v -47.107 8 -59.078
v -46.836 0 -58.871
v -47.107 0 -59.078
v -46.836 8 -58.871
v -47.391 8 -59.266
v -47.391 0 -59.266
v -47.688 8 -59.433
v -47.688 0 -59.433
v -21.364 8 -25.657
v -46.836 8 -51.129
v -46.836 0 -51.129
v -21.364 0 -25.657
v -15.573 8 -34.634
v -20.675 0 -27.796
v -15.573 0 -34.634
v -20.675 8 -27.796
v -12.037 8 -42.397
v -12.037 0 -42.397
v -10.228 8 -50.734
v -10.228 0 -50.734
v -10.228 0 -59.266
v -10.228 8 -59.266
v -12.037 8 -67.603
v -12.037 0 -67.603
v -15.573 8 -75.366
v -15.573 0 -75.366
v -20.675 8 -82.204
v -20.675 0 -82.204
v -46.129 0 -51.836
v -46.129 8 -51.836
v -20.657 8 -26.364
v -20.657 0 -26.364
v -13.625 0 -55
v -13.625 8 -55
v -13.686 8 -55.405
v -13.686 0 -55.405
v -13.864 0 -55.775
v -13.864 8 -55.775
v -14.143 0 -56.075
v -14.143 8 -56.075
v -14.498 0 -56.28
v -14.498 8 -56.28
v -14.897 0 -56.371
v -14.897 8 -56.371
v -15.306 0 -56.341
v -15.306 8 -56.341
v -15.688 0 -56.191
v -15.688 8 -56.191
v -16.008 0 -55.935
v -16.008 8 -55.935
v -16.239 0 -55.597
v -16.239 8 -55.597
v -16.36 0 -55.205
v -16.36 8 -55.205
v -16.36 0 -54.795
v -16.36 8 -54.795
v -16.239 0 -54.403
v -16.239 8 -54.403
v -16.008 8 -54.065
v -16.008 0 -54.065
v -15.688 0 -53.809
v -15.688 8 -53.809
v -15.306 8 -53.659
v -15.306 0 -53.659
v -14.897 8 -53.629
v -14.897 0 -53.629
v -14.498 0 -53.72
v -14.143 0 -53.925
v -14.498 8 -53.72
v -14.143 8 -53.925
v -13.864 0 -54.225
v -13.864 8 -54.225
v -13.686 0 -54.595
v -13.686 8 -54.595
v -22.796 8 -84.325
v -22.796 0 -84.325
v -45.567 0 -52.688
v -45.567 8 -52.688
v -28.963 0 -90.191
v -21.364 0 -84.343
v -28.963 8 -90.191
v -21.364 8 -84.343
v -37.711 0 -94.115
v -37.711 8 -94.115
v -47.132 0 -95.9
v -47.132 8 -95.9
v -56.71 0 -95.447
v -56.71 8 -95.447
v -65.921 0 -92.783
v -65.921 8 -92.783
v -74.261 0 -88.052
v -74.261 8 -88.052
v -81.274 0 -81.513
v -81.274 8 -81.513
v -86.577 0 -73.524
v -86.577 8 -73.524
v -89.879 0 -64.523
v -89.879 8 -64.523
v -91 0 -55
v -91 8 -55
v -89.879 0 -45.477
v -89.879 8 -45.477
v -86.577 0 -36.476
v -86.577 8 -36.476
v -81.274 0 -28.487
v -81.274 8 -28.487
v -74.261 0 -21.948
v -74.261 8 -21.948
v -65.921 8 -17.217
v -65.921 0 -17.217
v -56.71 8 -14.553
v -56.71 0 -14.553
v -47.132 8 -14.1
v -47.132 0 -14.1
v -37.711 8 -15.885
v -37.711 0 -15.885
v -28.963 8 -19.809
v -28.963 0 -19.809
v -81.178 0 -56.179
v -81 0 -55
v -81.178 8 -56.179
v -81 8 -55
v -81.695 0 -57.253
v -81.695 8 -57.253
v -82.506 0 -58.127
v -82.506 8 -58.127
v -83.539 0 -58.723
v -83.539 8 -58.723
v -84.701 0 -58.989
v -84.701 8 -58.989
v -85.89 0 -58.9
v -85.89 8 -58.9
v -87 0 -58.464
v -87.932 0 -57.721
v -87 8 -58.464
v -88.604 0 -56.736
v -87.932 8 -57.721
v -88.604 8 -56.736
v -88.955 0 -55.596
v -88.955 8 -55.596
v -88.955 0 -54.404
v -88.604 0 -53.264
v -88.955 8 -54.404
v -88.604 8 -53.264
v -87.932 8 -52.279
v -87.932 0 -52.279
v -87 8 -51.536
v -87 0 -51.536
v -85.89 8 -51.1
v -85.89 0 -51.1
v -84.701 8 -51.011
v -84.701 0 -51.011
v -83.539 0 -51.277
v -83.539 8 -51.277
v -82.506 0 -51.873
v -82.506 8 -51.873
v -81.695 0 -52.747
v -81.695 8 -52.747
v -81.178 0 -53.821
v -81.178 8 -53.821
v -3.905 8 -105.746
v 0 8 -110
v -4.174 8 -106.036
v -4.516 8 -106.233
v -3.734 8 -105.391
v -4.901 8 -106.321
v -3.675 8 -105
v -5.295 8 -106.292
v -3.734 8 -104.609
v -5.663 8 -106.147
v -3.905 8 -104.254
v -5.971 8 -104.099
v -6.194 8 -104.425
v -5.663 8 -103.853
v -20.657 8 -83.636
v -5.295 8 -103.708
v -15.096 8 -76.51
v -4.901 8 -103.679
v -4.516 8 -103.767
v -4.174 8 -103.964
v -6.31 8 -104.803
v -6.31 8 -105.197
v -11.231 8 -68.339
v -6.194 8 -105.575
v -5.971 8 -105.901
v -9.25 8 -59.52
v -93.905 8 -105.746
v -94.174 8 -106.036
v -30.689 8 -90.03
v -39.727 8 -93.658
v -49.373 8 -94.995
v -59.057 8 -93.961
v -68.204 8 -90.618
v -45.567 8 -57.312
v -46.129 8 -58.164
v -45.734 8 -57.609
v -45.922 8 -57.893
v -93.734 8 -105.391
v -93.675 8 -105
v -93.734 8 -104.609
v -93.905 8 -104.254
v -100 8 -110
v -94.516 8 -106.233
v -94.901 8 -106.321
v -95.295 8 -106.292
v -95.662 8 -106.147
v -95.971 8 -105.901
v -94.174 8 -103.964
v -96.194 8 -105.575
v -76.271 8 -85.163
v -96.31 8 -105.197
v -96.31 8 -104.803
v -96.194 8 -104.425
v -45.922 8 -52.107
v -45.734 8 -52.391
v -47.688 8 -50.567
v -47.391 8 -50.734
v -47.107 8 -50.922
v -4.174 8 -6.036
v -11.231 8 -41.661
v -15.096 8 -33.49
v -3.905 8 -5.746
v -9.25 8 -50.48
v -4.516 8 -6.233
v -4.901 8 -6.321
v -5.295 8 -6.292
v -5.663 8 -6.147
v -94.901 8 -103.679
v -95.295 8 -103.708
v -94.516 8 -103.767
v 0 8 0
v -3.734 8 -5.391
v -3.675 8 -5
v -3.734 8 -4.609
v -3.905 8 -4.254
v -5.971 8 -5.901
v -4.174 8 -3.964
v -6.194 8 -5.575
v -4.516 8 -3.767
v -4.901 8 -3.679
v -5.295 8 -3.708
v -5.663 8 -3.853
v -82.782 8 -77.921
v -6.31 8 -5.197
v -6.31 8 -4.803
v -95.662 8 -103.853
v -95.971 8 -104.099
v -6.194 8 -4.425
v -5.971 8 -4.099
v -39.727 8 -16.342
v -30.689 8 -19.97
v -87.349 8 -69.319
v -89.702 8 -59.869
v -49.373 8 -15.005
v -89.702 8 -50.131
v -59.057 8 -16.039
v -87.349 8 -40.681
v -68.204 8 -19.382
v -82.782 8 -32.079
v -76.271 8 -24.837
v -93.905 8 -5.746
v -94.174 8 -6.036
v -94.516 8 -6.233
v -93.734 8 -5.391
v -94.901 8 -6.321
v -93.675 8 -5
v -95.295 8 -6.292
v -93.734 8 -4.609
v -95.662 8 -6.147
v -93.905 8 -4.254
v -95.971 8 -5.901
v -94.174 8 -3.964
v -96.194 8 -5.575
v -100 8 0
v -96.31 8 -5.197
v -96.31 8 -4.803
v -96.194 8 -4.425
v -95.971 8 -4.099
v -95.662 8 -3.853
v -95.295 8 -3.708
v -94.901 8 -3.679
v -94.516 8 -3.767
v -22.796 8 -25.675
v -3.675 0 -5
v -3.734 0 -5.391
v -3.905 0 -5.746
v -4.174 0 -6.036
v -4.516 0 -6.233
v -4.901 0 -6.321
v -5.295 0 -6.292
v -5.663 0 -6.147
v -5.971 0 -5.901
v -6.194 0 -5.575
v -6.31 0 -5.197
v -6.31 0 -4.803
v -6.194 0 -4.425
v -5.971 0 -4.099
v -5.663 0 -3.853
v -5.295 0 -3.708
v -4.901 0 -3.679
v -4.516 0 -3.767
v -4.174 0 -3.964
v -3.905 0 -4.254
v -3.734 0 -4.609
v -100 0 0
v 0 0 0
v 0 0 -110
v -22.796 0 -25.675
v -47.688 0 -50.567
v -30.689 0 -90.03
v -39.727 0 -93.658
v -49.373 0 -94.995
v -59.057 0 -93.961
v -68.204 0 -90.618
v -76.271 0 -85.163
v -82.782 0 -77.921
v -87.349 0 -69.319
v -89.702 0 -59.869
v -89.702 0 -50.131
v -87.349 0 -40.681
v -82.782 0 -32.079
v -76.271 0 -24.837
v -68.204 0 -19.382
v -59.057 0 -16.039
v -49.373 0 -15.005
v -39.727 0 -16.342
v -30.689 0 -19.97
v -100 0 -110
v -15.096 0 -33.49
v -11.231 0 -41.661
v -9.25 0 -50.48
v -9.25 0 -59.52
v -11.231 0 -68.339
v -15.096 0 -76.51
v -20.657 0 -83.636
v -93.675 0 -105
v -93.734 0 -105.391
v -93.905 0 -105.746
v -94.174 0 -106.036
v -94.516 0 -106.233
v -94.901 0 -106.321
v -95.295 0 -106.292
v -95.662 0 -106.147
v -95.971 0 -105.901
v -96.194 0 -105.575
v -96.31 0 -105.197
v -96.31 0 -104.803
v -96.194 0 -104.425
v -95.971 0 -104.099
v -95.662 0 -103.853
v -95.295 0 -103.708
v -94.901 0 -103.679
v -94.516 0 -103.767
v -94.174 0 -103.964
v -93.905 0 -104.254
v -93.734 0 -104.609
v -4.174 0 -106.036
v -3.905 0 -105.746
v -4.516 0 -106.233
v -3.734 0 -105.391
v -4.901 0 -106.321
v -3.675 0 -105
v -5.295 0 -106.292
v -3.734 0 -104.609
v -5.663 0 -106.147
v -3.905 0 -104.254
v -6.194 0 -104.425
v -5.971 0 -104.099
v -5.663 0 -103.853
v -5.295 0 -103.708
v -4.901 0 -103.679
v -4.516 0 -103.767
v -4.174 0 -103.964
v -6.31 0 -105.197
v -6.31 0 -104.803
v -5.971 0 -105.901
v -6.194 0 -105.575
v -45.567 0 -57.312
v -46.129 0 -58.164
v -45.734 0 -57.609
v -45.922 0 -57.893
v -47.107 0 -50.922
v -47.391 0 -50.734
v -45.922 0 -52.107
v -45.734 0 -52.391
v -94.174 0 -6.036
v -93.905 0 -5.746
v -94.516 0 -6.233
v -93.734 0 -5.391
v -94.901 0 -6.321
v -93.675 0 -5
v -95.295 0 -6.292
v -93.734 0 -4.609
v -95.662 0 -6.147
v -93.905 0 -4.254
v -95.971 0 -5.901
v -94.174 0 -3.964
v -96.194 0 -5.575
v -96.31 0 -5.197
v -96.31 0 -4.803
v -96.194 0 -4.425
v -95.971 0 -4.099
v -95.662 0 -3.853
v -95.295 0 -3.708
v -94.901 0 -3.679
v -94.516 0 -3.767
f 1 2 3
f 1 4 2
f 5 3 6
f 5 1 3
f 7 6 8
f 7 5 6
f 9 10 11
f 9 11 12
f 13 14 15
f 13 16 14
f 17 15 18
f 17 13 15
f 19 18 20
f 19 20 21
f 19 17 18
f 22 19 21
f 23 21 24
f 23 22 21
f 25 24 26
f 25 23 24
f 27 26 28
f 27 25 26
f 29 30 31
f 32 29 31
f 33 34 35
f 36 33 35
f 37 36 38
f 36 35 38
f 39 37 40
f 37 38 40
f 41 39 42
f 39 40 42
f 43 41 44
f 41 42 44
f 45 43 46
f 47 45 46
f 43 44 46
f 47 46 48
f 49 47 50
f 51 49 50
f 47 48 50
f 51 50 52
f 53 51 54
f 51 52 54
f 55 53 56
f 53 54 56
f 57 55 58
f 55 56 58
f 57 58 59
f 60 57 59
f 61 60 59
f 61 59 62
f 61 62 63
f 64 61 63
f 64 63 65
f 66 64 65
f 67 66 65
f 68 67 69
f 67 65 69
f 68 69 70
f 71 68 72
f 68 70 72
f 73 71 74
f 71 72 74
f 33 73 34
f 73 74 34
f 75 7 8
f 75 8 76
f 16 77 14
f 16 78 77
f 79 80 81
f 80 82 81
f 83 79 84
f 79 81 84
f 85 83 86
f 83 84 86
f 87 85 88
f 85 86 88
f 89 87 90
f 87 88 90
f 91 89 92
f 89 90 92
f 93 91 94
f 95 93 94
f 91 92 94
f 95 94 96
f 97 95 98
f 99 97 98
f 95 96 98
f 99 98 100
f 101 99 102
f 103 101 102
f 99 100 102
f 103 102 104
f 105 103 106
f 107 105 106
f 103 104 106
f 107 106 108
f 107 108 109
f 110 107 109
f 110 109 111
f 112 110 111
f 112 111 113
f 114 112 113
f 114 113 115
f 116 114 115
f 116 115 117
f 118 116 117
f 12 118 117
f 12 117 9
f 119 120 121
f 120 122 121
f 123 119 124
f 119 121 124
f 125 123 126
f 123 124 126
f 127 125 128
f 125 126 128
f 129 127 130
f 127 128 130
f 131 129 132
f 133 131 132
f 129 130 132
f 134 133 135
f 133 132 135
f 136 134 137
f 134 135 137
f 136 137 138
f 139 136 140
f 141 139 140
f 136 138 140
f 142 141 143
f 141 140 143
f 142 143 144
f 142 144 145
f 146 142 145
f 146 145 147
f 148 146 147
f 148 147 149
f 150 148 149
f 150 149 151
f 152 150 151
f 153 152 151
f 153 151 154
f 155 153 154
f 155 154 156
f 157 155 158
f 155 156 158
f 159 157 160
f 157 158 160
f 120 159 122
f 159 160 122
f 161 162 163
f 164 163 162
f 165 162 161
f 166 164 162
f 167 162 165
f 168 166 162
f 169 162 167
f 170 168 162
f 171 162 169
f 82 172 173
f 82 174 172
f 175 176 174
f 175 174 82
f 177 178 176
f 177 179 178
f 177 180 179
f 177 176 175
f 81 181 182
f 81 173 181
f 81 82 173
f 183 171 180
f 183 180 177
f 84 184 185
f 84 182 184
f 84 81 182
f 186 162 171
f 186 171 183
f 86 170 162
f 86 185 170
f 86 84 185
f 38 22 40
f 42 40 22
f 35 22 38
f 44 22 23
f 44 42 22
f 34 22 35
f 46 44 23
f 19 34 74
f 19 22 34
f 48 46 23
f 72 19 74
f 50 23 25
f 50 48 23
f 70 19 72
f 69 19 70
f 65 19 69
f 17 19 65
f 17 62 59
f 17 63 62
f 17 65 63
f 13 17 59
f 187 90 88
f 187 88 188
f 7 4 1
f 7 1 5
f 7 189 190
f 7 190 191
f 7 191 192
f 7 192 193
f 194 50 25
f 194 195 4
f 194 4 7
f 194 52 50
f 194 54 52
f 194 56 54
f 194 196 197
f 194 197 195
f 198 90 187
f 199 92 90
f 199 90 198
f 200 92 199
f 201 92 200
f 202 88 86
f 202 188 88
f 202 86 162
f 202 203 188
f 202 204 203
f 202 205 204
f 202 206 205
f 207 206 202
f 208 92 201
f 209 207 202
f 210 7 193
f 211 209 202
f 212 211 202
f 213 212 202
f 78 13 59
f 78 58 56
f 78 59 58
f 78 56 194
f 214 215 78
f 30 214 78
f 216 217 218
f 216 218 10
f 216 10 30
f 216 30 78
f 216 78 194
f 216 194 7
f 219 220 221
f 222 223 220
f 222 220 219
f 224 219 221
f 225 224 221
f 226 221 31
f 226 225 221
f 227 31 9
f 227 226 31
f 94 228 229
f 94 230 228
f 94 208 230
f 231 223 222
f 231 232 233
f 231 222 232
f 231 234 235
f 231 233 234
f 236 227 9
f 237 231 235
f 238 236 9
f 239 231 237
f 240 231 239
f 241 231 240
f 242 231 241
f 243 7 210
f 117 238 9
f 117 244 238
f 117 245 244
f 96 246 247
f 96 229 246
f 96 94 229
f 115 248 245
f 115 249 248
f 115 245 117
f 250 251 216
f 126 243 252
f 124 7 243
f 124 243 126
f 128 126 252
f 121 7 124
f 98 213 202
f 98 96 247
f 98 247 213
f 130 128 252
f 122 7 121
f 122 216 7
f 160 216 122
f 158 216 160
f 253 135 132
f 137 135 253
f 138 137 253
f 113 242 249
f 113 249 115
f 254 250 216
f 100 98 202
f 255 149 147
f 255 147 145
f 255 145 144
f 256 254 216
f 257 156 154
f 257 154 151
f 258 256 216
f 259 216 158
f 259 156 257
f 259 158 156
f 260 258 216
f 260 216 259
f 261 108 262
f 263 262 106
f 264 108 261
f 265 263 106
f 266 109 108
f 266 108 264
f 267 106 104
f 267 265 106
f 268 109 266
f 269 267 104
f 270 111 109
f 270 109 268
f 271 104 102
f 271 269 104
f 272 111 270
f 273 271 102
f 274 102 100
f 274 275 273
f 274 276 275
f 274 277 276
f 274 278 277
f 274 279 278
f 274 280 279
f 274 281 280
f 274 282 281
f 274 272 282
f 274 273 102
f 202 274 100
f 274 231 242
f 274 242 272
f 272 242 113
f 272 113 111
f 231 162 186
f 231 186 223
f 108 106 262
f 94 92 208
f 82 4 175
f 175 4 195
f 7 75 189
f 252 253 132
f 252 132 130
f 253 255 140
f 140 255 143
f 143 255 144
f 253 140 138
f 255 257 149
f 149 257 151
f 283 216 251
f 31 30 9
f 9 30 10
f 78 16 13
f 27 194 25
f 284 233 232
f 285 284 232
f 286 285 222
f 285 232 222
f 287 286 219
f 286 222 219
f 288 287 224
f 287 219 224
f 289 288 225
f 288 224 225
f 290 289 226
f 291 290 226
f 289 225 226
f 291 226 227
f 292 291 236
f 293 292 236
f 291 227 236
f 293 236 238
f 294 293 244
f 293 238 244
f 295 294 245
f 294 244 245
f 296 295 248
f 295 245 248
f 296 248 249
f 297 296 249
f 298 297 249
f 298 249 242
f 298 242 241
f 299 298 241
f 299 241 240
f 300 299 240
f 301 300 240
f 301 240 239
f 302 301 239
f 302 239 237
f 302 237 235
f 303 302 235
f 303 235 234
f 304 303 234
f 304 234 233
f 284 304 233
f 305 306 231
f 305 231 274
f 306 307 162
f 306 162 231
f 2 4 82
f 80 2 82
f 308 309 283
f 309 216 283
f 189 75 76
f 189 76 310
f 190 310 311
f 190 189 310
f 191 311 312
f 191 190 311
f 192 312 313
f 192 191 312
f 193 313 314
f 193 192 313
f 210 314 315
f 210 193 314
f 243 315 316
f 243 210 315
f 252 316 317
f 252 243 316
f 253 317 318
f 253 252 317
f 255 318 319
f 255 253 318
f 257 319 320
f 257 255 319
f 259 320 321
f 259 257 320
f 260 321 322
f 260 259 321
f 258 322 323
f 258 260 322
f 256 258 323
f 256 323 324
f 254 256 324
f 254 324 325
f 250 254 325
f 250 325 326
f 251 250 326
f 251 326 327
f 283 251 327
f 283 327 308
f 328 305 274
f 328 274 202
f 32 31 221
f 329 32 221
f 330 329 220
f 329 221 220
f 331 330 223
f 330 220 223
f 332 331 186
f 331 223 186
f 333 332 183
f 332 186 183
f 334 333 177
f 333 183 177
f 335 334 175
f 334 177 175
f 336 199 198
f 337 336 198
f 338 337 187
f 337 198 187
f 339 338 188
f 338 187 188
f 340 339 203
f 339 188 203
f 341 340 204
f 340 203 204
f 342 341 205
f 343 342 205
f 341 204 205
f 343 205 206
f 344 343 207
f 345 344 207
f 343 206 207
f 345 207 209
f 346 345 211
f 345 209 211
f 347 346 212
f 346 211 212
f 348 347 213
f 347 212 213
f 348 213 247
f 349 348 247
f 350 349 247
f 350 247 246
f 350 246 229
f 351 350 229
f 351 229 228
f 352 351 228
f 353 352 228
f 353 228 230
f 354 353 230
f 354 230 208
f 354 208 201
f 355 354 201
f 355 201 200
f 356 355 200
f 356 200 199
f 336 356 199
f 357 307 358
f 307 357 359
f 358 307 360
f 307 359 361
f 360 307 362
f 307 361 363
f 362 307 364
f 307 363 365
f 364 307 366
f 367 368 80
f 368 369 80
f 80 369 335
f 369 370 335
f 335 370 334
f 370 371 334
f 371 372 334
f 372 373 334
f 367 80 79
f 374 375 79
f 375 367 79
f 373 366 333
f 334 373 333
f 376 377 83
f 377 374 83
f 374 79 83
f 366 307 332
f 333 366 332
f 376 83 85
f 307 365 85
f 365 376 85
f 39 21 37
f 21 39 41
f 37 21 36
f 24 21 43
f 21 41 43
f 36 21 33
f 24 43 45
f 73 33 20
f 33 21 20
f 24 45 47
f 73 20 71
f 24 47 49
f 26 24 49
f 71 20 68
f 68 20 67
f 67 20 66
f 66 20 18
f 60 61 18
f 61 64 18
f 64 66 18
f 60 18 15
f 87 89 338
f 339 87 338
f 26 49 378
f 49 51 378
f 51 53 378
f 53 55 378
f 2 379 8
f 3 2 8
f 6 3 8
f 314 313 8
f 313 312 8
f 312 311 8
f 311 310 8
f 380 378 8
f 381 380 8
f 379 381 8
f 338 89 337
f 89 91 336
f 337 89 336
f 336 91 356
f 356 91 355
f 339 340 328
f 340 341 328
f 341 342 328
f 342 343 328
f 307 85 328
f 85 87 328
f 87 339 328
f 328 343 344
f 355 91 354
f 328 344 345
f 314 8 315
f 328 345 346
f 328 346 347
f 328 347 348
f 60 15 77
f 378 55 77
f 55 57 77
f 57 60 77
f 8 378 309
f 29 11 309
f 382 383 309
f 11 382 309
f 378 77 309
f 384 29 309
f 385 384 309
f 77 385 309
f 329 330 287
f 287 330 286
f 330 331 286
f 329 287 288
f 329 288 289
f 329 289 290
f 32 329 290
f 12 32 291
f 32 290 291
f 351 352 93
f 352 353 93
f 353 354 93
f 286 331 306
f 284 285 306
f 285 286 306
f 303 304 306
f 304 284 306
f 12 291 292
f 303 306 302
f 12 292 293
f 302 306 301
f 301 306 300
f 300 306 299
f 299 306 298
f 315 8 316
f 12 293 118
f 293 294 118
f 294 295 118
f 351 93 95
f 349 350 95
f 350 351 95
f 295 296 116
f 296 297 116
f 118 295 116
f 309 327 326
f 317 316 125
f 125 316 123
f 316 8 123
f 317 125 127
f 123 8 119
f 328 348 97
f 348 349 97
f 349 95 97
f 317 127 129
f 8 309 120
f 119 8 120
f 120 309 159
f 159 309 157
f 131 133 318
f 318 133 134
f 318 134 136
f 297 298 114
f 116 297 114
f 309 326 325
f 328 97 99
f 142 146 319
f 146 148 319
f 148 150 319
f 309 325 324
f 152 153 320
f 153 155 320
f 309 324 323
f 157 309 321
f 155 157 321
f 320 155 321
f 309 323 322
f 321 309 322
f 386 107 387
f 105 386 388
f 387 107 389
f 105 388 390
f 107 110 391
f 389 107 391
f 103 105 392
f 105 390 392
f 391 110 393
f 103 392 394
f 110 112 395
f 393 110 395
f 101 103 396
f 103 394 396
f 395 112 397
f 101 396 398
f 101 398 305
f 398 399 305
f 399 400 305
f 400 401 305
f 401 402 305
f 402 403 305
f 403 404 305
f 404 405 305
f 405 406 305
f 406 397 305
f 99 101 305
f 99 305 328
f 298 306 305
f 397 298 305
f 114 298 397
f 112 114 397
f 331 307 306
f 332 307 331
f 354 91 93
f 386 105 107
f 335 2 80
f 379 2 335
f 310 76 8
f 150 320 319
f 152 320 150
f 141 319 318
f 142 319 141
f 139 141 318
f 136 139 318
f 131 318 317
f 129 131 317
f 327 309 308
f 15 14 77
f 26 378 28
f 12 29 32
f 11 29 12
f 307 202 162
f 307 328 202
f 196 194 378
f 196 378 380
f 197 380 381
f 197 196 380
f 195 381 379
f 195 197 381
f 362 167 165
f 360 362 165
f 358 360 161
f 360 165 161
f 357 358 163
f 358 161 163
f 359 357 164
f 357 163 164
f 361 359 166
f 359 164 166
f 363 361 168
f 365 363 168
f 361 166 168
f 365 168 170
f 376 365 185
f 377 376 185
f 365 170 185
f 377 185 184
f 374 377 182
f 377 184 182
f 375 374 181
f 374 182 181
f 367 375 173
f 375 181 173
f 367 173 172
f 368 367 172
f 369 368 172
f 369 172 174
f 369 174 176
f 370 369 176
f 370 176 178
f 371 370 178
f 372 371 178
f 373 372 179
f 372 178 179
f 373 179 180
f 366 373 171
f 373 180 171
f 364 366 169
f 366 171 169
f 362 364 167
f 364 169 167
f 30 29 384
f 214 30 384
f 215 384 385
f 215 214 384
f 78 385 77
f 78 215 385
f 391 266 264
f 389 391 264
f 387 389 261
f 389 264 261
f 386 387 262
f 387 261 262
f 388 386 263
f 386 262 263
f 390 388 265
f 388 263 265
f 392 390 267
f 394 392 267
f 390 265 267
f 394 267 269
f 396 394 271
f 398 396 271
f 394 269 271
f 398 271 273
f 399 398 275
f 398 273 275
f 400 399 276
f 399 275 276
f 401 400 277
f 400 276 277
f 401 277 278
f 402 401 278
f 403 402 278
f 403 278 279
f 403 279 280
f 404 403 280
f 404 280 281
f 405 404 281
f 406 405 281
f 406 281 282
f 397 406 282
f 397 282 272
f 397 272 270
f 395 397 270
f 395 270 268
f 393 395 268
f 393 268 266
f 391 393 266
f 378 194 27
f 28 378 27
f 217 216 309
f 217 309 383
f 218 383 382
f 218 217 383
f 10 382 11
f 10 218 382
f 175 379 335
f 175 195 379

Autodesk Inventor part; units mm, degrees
ref_plane "YZ Plane" through (0, 0, 0) normal (1, 0, 0) x (0, 1, 0)
ref_plane "XZ Plane" through (0, 0, 0) normal (0, 1, 0) x (-1, 0, 0)
ref_plane "XY Plane" through (0, 0, 0) normal (0, 0, 1) x (1, 0, 0)
sketch "Sketch1" plane through (0, 0, 0) normal (0, 1, 0) x (-1, 0, 0)
  line L0 (0, 0) -> (100, 0)
  line L1 (100, 0) -> (100, -110)
  line L2 (100, -110) -> (0, -110)
  line L3 (0, -110) -> (0, 0)
  line L4 (0, 0) -> (0, 0)
  line L5 (0, 0) -> (0, -150)
  line L6 (0, -150) -> (0, -150)
  line L7 (0, -150) -> (0, 0)
  line L8 (100, 0) -> (100, 0)
  line L9 (100, 0) -> (100, -150)
  line L10 (100, -150) -> (100, -150)
  line L11 (100, -150) -> (100, 0)
  point P0 (100, -110)
  point P1 (0, 0)
  point P2 (0, -110)
  dimension "d0" = 100
  dimension "d1" = 110
  dimension "d2" = 0
  dimension "d3" = 0
  dimension "d4" = 150
  dimension "d5" = 150
extrude "Extrusion1" add sketch "Sketch1" along normal blind 8
sketch "Sketch2" plane through (0, 8, 0) normal (0, 1, 0) x (1, 0, 0)
  circle A0 centre (-95, 5) radius 1.325
  line L0 (-100, 0) -> (0, 0) projected
  line L1 (-100, 110) -> (-100, 0) projected
  line L2 (-100, 55) -> (-85.0305, 55)
  line L3 (-50, 0) -> (-50, 9.4063)
  circle A1 centre (-95, 105) radius 1.325
  circle A2 centre (-5, 5) radius 1.325
  circle A3 centre (-5, 105) radius 1.325
  point P0 (0, 110)
  dimension "d118" = 5
  dimension "d119" = 5
  dimension "d120" = 2.65
extrude "Extrusion2" cut sketch "Sketch2" against normal blind 20
sketch "Sketch8" plane through (0, 8, 0) normal (0, 1, 0) x (1, 0, 0)
  line L0 (0, 0) -> (0, 110) projected
  arc A0 (-46.8357, 58.8714) -> (-46.1286, 58.1643) centre (-50, 55) ccw
  line L1 (-100, 0) -> (0, 0) projected
  line L2 (-55, 55) -> (-100, 55)
  line L3 (-100, 110) -> (-100, 0) projected
  line L4 (-50.2848, 59.9919) -> (-50.2848, 110)
  line L5 (0, 110) -> (-100, 110) projected
  circle A1 centre (-50, 55) radius 41
  circle A2 centre (-15, 55) radius 1.375
  circle A3 centre (-85, 55) radius 4
  line L6 (-50, 55) -> (-21.7157, 83.2843)
  line L7 (-46.8357, 58.8714) -> (-21.3643, 84.3428)
  line L8 (-46.1286, 58.1643) -> (-20.6572, 83.6357)
  line L9 (-47.688, 59.4333) -> (-22.7963, 84.325)
  line L10 (-45.5667, 57.312) -> (-20.675, 82.2037)
  arc A4 (-22.7963, 84.325) -> (-20.675, 82.2037) centre (-50, 55) ccw
  line L11 (-50, 55) -> (-21.7157, 26.7157)
  line L12 (-45.5667, 52.688) -> (-20.675, 27.7963)
  line L13 (-47.688, 50.5667) -> (-22.7963, 25.675)
  line L14 (-46.8357, 51.1286) -> (-21.3643, 25.6572)
  line L15 (-46.1286, 51.8357) -> (-20.6572, 26.3643)
  point P0 (-54.7697, 53.5)
  point P1 (-54.7697, 56.5)
  point P2 (-48.7848, 59.8501)
  point P3 (-21.3644, 27.0715)
  point P4 (-22.0715, 26.3644)
  dimension "d134" = 10
  dimension "d132" = 50
  dimension "d133" = 55
  dimension "d136" = 82
  dimension "d145" = 35
  dimension "d146" = 0
  dimension "d147" = 2.75
  dimension "d155" = 8
  dimension "d156" = 35
  dimension "d157" = 45
  dimension "d158" = 0.5
  dimension "d159" = 0.5
  dimension "d160" = 1
  dimension "d161" = 1
  dimension "d164" = 90
extrude "Extrusion5" cut sketch "Sketch8" against normal blind 20 contours A1 L7 A0 L9 A4 L4 | L4 A4 L2 A1 | L2 A4 L14 A1 | A1 L15 A4 L10 A0 L8 | A3 L2 | L2 A3 | L13 A0 L14 A4 | L15 A0 L12 A4 | A2
equation "\"d19\" = d18"
equation "\"d21\" = d22"
equation "\"BladeThickness\" = 1"
equation "\"NeckThickness\" = 1"
equation "\"d18\" = 45"
equation "\"d22\" = 47"
properties part number "FlexK7V2"
